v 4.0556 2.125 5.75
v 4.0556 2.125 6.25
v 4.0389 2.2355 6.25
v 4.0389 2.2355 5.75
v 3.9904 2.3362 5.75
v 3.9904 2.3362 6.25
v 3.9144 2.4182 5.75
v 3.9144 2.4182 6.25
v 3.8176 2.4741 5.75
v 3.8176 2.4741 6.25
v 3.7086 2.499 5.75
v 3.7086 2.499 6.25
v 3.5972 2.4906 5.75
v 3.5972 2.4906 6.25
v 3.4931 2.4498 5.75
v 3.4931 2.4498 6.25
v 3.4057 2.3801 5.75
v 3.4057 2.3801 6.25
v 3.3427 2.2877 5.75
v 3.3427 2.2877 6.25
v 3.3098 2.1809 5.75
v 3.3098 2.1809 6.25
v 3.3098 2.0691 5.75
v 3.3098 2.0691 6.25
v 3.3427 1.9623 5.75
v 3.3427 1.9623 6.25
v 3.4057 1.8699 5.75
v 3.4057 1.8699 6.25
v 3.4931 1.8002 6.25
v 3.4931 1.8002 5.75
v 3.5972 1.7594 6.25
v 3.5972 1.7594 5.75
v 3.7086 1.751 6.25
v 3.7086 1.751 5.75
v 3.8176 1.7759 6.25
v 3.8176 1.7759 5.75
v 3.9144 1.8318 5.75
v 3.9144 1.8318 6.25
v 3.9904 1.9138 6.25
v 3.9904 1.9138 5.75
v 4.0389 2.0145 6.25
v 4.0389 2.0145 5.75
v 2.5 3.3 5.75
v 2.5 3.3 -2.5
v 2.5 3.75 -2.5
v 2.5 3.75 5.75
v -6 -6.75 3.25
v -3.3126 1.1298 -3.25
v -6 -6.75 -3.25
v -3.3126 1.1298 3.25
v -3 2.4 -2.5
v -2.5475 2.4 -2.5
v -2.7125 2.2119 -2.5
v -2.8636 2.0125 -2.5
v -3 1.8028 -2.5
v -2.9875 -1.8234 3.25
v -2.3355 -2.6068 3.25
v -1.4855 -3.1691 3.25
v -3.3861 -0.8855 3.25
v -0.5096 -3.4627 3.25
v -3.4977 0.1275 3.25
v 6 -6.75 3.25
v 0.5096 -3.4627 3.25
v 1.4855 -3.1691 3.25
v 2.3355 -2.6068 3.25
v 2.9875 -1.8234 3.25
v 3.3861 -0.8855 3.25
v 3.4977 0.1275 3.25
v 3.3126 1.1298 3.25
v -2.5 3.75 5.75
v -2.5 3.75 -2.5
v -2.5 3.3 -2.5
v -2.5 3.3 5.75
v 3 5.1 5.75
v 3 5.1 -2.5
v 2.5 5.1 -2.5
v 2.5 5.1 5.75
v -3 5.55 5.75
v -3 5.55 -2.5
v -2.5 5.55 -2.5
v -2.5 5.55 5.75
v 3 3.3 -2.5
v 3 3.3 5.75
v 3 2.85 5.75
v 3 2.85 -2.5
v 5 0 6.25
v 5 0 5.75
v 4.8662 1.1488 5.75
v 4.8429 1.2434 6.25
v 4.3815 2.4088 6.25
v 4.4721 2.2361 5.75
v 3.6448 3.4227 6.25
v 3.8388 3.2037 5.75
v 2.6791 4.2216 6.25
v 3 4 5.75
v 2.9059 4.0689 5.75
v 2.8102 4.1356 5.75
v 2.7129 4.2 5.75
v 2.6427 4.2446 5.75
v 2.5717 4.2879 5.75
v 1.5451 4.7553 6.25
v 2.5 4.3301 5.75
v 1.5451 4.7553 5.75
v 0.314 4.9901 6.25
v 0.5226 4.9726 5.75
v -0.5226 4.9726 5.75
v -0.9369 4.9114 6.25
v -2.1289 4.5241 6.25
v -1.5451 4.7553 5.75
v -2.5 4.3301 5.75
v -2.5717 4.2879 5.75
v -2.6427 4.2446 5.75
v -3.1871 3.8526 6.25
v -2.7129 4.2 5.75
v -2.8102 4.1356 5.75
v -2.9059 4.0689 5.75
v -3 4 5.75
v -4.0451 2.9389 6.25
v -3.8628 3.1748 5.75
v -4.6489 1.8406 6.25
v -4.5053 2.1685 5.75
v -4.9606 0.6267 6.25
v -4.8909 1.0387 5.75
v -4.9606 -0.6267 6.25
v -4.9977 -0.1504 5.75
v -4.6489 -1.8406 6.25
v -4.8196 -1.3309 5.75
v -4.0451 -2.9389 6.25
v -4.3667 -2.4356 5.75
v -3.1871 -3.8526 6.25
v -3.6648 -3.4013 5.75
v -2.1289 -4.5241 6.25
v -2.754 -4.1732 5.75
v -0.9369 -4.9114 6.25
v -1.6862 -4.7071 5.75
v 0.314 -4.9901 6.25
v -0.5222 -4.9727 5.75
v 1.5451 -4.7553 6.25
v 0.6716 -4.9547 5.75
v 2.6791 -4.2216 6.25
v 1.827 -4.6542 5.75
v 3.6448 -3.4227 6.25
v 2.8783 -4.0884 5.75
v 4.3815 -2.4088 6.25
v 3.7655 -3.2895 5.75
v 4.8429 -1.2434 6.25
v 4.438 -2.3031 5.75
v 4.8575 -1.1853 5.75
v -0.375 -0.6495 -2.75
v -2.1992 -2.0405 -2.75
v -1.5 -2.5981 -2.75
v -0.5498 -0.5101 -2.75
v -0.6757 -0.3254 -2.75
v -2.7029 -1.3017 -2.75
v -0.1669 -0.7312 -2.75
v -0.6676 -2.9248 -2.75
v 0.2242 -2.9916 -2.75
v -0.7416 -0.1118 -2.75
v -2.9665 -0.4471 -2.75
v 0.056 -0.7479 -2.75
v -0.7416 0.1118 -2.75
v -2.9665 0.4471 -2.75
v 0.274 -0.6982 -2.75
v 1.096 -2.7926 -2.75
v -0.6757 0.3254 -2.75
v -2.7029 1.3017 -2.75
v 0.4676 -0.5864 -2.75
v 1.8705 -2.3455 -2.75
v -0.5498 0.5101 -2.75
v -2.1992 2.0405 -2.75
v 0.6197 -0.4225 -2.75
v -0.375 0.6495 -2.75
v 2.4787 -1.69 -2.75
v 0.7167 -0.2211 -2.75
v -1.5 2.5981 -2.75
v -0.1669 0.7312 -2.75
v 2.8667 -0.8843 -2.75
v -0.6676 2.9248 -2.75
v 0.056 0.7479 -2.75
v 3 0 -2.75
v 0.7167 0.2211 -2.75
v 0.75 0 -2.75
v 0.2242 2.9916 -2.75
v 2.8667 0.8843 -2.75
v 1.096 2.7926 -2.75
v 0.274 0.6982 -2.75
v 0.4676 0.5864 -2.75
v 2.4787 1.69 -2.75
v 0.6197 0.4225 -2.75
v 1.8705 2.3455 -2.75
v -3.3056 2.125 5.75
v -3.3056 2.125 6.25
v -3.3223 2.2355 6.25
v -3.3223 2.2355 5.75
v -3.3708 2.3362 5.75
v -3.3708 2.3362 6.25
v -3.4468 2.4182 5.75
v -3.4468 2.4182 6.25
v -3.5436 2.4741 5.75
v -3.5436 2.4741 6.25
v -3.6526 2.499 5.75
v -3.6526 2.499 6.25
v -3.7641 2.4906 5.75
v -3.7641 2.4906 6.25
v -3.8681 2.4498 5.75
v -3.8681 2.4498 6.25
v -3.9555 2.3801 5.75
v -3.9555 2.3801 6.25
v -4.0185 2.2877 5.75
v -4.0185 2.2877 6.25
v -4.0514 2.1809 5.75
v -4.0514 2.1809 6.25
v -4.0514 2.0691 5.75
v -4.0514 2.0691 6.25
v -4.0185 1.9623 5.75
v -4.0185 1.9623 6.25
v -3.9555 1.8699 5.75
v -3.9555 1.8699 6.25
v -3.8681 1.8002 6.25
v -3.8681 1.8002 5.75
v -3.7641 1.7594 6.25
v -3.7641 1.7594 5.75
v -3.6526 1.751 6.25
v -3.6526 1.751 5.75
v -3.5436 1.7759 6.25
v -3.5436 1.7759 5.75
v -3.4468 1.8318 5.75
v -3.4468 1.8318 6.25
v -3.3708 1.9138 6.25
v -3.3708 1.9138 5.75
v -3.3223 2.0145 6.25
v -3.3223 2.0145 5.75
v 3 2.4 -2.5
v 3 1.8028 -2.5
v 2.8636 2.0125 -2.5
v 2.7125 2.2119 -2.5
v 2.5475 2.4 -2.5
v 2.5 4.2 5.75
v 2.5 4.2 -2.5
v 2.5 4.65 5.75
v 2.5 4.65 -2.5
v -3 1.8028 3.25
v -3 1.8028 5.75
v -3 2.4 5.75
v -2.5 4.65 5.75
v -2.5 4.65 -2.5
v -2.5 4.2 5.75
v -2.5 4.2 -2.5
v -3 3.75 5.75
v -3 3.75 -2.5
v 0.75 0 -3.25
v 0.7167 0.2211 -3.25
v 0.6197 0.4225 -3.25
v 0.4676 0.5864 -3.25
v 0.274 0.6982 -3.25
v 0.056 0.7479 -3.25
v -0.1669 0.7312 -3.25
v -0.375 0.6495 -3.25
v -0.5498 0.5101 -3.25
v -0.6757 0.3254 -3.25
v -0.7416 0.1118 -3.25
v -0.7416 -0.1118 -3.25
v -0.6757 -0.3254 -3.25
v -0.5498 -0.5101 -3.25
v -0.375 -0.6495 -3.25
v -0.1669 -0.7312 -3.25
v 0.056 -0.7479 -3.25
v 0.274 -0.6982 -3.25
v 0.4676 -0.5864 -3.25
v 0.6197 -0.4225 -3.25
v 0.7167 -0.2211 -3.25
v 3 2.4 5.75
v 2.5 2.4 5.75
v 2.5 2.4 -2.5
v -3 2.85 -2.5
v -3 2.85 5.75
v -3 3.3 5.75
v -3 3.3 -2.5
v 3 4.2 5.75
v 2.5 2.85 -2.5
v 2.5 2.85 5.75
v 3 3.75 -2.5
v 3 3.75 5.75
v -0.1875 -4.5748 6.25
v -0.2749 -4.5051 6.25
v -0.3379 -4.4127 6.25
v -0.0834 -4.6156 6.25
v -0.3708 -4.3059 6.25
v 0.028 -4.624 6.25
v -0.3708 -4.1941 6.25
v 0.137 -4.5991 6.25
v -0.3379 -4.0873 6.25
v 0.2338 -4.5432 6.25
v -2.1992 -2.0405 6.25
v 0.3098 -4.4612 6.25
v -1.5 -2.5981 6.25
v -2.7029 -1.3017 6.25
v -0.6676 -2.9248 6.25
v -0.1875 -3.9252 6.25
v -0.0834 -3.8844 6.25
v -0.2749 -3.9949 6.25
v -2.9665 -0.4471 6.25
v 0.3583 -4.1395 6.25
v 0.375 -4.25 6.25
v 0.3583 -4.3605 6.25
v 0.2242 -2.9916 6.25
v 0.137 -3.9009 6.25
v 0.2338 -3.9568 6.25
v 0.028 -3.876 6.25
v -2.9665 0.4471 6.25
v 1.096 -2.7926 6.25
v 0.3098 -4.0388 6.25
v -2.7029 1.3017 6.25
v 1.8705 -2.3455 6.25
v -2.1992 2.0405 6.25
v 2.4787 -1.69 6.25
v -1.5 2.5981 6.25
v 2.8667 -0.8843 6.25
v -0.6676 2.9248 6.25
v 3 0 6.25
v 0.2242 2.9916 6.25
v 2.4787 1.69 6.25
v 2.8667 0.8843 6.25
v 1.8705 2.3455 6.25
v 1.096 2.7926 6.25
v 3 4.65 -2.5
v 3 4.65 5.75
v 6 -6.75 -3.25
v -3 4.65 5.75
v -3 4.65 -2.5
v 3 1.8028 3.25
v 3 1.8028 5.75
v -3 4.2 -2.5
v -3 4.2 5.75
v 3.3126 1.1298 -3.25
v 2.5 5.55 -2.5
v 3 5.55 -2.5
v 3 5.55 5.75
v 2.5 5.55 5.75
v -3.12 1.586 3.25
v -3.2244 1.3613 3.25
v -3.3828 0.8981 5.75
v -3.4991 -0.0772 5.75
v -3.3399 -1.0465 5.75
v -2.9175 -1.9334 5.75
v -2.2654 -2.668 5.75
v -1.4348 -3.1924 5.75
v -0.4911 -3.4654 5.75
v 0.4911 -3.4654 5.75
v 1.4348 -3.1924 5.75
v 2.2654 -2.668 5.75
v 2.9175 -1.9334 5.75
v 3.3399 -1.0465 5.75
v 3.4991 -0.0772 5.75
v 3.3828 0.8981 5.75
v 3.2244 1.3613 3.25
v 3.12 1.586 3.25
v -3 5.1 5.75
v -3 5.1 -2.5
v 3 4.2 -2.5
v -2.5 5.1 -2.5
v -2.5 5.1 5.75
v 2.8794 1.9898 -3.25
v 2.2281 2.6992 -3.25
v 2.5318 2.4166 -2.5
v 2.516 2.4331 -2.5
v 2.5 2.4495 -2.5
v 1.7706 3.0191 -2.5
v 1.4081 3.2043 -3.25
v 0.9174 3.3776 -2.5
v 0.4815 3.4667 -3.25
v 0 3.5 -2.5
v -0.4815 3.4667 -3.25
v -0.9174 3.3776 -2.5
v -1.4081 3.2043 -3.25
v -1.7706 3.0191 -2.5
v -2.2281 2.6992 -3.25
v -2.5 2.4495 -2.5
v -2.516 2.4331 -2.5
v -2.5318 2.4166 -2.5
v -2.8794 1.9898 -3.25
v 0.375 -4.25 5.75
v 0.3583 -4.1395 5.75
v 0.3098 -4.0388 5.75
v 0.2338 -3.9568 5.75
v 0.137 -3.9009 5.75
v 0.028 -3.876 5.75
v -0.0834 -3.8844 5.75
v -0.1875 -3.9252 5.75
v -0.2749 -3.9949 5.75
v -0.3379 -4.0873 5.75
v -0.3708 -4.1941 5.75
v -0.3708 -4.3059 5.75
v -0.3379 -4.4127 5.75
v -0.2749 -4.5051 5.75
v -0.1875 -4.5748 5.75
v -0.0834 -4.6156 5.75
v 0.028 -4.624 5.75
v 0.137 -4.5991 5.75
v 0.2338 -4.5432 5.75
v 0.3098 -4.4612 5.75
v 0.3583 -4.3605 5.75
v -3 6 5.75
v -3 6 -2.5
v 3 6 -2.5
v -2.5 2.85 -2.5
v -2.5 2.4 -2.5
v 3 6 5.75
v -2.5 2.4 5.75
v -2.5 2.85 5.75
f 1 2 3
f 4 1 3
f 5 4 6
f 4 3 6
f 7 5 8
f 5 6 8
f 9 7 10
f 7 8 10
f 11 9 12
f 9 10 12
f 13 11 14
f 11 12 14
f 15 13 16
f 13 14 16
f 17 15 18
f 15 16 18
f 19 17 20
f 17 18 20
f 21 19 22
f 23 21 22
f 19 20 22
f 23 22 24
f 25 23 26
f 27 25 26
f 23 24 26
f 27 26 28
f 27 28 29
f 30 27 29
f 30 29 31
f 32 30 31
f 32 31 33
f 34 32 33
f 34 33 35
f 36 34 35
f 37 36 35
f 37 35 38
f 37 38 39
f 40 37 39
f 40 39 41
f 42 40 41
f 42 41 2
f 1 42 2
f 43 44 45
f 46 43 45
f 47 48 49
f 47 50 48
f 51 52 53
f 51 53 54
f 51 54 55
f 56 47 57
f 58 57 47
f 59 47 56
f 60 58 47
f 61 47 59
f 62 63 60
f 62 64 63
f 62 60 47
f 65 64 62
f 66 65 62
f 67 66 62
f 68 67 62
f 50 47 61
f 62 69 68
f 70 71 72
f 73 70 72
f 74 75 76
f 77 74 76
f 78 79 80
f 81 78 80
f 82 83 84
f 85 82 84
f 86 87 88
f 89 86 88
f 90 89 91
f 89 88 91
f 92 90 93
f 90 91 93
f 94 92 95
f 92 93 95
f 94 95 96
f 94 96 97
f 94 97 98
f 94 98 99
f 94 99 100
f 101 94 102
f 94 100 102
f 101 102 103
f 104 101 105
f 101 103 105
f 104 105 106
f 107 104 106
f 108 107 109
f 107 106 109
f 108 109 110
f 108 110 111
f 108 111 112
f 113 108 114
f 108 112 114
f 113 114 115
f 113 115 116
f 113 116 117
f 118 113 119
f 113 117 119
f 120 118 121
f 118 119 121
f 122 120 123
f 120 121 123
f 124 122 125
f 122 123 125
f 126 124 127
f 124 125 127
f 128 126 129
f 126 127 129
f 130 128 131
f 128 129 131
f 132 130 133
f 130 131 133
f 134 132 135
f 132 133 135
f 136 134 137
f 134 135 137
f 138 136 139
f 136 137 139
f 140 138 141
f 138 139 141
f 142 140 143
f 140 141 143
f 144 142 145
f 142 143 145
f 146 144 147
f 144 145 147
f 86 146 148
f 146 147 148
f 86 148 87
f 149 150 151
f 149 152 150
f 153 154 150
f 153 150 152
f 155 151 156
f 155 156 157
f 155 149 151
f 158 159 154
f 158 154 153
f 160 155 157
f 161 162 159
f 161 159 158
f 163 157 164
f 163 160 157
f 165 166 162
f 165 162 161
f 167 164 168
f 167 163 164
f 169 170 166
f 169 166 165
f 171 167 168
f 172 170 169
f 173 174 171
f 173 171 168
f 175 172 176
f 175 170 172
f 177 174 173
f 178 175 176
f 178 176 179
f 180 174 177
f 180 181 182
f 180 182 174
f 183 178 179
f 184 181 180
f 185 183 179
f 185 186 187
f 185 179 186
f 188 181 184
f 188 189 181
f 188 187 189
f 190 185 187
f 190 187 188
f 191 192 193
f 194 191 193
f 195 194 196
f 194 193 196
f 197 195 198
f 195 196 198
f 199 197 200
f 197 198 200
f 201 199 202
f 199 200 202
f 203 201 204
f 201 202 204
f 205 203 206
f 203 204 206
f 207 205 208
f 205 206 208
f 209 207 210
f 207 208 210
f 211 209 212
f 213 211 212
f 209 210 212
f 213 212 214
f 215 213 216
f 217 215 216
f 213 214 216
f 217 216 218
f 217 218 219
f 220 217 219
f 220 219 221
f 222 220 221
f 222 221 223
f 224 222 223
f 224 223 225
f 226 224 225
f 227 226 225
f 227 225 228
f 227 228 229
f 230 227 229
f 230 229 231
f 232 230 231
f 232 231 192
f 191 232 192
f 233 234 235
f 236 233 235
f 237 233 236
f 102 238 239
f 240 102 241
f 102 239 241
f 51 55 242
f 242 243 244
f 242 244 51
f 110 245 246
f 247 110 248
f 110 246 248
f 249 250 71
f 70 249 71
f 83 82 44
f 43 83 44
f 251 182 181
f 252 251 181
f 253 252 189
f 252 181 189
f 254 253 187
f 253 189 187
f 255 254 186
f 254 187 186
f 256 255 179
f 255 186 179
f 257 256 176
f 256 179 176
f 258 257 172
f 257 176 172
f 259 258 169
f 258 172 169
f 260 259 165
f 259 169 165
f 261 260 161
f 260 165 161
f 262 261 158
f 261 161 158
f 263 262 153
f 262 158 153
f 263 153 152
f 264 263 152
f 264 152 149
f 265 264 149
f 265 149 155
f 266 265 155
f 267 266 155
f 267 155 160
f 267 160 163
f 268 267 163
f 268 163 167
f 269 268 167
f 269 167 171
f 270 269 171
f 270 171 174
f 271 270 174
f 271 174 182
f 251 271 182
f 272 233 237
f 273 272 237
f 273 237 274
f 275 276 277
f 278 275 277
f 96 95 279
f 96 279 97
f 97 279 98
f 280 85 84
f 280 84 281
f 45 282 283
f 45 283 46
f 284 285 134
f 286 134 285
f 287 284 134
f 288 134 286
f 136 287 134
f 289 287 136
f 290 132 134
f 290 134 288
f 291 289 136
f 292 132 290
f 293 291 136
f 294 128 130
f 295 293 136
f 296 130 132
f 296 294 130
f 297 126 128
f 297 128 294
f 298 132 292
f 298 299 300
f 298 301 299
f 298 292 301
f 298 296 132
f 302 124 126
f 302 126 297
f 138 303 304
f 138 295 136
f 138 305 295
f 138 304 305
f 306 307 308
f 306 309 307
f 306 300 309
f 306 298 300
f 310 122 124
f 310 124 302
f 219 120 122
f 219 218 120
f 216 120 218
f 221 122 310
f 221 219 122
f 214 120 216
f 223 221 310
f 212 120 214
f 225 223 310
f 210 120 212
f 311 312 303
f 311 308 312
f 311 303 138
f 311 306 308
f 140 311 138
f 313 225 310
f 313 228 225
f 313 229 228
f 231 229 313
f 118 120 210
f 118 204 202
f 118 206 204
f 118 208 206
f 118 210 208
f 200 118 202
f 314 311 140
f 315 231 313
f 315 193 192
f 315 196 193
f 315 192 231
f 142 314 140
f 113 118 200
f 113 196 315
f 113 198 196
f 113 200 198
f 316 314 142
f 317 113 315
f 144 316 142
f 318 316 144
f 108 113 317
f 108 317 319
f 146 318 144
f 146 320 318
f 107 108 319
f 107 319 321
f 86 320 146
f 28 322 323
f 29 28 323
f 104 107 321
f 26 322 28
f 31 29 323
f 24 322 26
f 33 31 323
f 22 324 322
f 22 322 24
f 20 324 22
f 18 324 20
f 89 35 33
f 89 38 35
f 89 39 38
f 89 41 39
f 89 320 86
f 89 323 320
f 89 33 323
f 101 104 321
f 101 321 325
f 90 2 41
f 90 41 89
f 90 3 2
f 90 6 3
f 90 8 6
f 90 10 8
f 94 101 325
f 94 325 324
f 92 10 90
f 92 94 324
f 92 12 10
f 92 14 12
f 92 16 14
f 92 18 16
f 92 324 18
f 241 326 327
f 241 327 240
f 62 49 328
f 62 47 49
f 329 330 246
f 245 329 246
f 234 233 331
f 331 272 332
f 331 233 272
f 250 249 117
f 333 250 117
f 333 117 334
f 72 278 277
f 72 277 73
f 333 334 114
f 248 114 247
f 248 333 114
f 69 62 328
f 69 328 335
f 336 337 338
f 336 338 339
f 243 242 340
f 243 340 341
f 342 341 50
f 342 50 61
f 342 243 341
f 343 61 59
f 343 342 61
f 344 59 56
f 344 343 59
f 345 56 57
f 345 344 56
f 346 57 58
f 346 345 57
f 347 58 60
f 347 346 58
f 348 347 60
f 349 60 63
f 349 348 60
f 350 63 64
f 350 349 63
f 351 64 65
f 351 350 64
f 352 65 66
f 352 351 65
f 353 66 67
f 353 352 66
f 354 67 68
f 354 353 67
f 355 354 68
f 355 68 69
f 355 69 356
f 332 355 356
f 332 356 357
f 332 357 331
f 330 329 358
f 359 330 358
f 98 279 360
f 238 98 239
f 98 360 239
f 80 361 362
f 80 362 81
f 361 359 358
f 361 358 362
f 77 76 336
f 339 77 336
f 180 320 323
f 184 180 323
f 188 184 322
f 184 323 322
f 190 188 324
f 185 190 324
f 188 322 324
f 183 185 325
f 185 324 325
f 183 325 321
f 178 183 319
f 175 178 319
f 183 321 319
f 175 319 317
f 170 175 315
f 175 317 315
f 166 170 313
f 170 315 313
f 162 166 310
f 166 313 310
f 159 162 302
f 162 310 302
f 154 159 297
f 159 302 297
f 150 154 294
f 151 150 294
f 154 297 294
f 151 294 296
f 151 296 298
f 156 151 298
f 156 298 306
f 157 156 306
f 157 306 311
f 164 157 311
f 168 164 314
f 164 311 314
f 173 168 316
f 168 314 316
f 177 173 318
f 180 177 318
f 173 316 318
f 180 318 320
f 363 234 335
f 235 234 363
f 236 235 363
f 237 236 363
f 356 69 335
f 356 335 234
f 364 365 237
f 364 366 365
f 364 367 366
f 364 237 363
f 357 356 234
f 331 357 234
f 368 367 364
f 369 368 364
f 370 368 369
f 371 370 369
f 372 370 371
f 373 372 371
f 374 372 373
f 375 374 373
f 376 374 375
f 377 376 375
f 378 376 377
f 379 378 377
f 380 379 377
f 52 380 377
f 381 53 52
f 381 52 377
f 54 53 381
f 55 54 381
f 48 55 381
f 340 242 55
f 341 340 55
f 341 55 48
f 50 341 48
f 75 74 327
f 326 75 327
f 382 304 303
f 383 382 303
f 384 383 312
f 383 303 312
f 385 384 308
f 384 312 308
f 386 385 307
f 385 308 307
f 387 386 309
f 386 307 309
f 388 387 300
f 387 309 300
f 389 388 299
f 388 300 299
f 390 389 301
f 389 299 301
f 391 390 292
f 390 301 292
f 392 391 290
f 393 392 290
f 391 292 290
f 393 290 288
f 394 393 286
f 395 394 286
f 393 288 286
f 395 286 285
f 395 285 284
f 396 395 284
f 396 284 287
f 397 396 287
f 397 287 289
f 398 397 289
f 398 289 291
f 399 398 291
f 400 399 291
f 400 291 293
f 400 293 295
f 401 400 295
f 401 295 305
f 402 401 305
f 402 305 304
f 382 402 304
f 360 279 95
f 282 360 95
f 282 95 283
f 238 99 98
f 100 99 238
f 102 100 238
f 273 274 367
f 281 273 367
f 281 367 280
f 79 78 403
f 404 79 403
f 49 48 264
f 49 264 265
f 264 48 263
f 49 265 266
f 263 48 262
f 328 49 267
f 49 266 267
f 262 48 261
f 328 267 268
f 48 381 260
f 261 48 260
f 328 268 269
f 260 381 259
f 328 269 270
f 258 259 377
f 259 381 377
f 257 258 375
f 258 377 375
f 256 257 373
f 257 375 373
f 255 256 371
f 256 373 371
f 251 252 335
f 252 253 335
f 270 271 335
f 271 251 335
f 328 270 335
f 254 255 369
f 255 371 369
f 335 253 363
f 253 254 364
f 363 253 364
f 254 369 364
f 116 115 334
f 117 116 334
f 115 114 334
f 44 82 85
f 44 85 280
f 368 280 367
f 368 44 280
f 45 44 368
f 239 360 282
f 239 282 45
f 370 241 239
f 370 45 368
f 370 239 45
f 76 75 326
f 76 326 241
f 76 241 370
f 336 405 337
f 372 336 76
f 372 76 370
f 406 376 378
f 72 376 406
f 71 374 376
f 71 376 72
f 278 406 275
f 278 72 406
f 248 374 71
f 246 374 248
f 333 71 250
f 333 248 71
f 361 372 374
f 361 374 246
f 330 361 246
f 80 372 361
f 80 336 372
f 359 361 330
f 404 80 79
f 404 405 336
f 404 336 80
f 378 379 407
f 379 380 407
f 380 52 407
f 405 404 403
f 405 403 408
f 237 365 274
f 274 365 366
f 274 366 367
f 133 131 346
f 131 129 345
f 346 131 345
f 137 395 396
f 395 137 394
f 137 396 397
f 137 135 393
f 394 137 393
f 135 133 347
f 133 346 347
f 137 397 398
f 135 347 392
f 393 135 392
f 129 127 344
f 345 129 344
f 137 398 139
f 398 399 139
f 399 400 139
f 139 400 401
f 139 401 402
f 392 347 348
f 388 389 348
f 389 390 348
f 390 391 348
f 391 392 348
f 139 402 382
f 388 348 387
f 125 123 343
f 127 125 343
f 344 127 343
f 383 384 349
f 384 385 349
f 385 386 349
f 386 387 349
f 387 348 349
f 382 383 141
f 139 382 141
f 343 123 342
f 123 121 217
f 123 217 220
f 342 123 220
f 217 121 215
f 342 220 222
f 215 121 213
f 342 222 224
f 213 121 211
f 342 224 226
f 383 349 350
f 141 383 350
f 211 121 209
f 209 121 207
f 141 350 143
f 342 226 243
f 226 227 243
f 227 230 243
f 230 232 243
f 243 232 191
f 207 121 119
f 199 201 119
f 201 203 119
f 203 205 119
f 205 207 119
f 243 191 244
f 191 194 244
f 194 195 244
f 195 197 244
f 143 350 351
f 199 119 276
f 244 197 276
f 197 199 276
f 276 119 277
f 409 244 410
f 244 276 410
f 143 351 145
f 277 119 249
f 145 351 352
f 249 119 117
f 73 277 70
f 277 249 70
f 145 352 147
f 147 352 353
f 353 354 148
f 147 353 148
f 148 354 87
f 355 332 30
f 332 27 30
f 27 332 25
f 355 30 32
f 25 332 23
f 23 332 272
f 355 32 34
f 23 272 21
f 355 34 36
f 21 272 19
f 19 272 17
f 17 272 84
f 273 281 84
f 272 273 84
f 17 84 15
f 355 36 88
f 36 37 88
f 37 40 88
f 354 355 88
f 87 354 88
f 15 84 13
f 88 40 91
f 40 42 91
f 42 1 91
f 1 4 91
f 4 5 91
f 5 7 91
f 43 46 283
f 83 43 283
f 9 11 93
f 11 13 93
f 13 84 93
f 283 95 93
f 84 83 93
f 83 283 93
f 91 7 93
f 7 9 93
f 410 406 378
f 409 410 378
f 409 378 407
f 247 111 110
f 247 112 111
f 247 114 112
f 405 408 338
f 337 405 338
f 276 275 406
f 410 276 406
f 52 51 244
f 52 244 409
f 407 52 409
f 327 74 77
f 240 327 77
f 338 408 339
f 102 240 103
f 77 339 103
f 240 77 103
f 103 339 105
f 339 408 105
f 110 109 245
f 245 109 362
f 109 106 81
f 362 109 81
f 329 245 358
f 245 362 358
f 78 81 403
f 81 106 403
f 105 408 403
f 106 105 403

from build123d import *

# Parameters (mm, degrees)
BOSS_EXTRUDE1_DEPTH     = 3.25
BOSS_EXTRUDE2_START     = 2.5
SKETCH2_R               = 3.5
BOSS_EXTRUDE2_DEPTH     = 2.5
SKETCH3_R               = 5
BOSS_EXTRUDE3_DEPTH     = 0.5
BOSS_EXTRUDE4_DEPTH     = 8.25
SKETCH6_W               = 0.5
SKETCH6_H               = 0.45
CUT_EXTRUDE1_DEPTH      = 8.25
LPATTERN1_COUNT         = 4
LPATTERN1_PITCH         = 0.9
MIRROR1_COPY_1_SKETCH_W = 0.5
MIRROR1_COPY_1_SKETCH_H = 0.45
MIRROR1_COPY_1_DEPTH    = 8.25
MIRROR1_COPY_2_SKETCH_W = 0.5
MIRROR1_COPY_2_SKETCH_H = 0.45
MIRROR1_COPY_2_DEPTH    = 8.25
MIRROR1_COPY_3_SKETCH_W = 0.5
MIRROR1_COPY_3_SKETCH_H = 0.45
MIRROR1_COPY_3_DEPTH    = 8.25
MIRROR1_COPY_4_SKETCH_W = 0.5
MIRROR1_COPY_4_SKETCH_H = 0.45
MIRROR1_COPY_4_DEPTH    = 8.25
SKETCH7_R               = 3
CUT_EXTRUDE2_DEPTH      = 9
SKETCH7_4_R             = 0.75
CUT_EXTRUDE3_DEPTH      = 14.107726729
CUT_EXTRUDE4_REACH      = 15.108
SKETCH7_5_R             = 0.375


with BuildPart() as part:
    # Sketch1 → Boss-Extrude1 (new, symmetric)
    with BuildSketch(Plane.XY):
        with BuildLine():
            Line((-6, -6.75), (6, -6.75))
            Line((6, -6.75), (3.312648335, 1.129761483))
            ThreePointArc((3.312648335, 1.129761483), (0, 3.5), (-3.312648335, 1.129761483))
            Line((-3.312648335, 1.129761483), (-6, -6.75))
        make_face()
    extrude(amount=BOSS_EXTRUDE1_DEPTH, both=True)

    # Sketch2 → Boss-Extrude2 (add)
    with BuildSketch(Plane.XY.offset(3.25).offset(BOSS_EXTRUDE2_START)):
        Circle(SKETCH2_R)
    extrude(amount=-BOSS_EXTRUDE2_DEPTH)

    # Sketch3 → Boss-Extrude3 (add)
    with BuildSketch(Plane.XY.offset(5.75)):
        Circle(SKETCH3_R)
    extrude(amount=BOSS_EXTRUDE3_DEPTH)

    # Sketch5 → Boss-Extrude4 (add)
    with BuildSketch(Plane(origin=(0, 0, 5.75), x_dir=(-1, 0, 0), z_dir=(0, 0, -1))):
        with BuildLine():
            ThreePointArc((-3, 1.802775638), (0, 3.5), (3, 1.802775638))
            Line((3, 1.802775638), (3, 6))
            Line((3, 6), (-3, 6))
            Line((-3, 6), (-3, 1.802775638))
        make_face()
    extrude(amount=BOSS_EXTRUDE4_DEPTH)

    # Sketch6 → Cut-Extrude1 (cut)
    with BuildSketch(Plane(origin=(0, 0, -2.5), x_dir=(-1, 0, 0), z_dir=(0, 0, -1))):
        with Locations((-2.75, 5.325)):
            Rectangle(SKETCH6_W, SKETCH6_H)
    cut_extrude1 = extrude(amount=-CUT_EXTRUDE1_DEPTH, mode=Mode.SUBTRACT)

    # LPattern1: Cut-Extrude1 ×4
    with Locations(*[(0, -i * LPATTERN1_PITCH, 0) for i in range(1, LPATTERN1_COUNT)]):
        add(cut_extrude1, mode=Mode.SUBTRACT)

    # Mirror1 copy 1 sketch → Mirror1 copy 1 (cut)
    with BuildSketch(Plane(origin=(0, -0.9, -2.5), x_dir=(1, 0, 0), z_dir=(0, 0, -1))):
        with Locations((-2.75, -5.325)):
            Rectangle(MIRROR1_COPY_1_SKETCH_W, MIRROR1_COPY_1_SKETCH_H)
    extrude(amount=-MIRROR1_COPY_1_DEPTH, mode=Mode.SUBTRACT)

    # Mirror1 copy 2 sketch → Mirror1 copy 2 (cut)
    with BuildSketch(Plane(origin=(0, -1.8, -2.5), x_dir=(1, 0, 0), z_dir=(0, 0, -1))):
        with Locations((-2.75, -5.325)):
            Rectangle(MIRROR1_COPY_2_SKETCH_W, MIRROR1_COPY_2_SKETCH_H)
    extrude(amount=-MIRROR1_COPY_2_DEPTH, mode=Mode.SUBTRACT)

    # Mirror1 copy 3 sketch → Mirror1 copy 3 (cut)
    with BuildSketch(Plane(origin=(0, -2.7, -2.5), x_dir=(1, 0, 0), z_dir=(0, 0, -1))):
        with Locations((-2.75, -5.325)):
            Rectangle(MIRROR1_COPY_3_SKETCH_W, MIRROR1_COPY_3_SKETCH_H)
    extrude(amount=-MIRROR1_COPY_3_DEPTH, mode=Mode.SUBTRACT)

    # Mirror1 copy 4 sketch → Mirror1 copy 4 (cut)
    with BuildSketch(Plane(origin=(0, 0, -2.5), x_dir=(1, 0, 0), z_dir=(0, 0, -1))):
        with Locations((-2.75, -5.325)):
            Rectangle(MIRROR1_COPY_4_SKETCH_W, MIRROR1_COPY_4_SKETCH_H)
    extrude(amount=-MIRROR1_COPY_4_DEPTH, mode=Mode.SUBTRACT)

    # Sketch7 → Cut-Extrude2 (cut)
    with BuildSketch(Plane.XY.offset(6.25)):
        Circle(SKETCH7_R)
    extrude(amount=-CUT_EXTRUDE2_DEPTH, mode=Mode.SUBTRACT)

    # Sketch7<4> → Cut-Extrude3 (cut, through all)
    with BuildSketch(Plane.XY.offset(6.25)):
        Circle(SKETCH7_4_R)
    extrude(amount=-CUT_EXTRUDE3_DEPTH, mode=Mode.SUBTRACT)

    # Sketch7<5> → Cut-Extrude4 (cut, up to next)
    with BuildSketch(Plane.XY.offset(6.25), mode=Mode.PRIVATE) as cut_extrude4_sk1:
        with Locations((0, -4.25)):
            Circle(SKETCH7_5_R)
    cut_extrude4_tool1 = extrude(cut_extrude4_sk1.sketch, amount=-CUT_EXTRUDE4_REACH, mode=Mode.PRIVATE) & part.part
    # Sketch7<5> → Cut-Extrude4 (cut, up to next)
    with BuildSketch(Plane.XY.offset(6.25), mode=Mode.PRIVATE) as cut_extrude4_sk2:
        with Locations((-3.680607966, 2.125)):
            Circle(SKETCH7_5_R)
    cut_extrude4_tool2 = extrude(cut_extrude4_sk2.sketch, amount=-CUT_EXTRUDE4_REACH, mode=Mode.PRIVATE) & part.part
    # Sketch7<5> → Cut-Extrude4 (cut, up to next)
    with BuildSketch(Plane.XY.offset(6.25), mode=Mode.PRIVATE) as cut_extrude4_sk3:
        with Locations((3.680607966, 2.125)):
            Circle(SKETCH7_5_R)
    cut_extrude4_tool3 = extrude(cut_extrude4_sk3.sketch, amount=-CUT_EXTRUDE4_REACH, mode=Mode.PRIVATE) & part.part
    add(cut_extrude4_tool1.solids().sort_by_distance((0, -4.25, 6.25))[0], mode=Mode.SUBTRACT)
    add(cut_extrude4_tool2.solids().sort_by_distance((-3.680608, 2.125, 6.25))[0], mode=Mode.SUBTRACT)
    add(cut_extrude4_tool3.solids().sort_by_distance((3.680608, 2.125, 6.25))[0], mode=Mode.SUBTRACT)


solid = part.part
